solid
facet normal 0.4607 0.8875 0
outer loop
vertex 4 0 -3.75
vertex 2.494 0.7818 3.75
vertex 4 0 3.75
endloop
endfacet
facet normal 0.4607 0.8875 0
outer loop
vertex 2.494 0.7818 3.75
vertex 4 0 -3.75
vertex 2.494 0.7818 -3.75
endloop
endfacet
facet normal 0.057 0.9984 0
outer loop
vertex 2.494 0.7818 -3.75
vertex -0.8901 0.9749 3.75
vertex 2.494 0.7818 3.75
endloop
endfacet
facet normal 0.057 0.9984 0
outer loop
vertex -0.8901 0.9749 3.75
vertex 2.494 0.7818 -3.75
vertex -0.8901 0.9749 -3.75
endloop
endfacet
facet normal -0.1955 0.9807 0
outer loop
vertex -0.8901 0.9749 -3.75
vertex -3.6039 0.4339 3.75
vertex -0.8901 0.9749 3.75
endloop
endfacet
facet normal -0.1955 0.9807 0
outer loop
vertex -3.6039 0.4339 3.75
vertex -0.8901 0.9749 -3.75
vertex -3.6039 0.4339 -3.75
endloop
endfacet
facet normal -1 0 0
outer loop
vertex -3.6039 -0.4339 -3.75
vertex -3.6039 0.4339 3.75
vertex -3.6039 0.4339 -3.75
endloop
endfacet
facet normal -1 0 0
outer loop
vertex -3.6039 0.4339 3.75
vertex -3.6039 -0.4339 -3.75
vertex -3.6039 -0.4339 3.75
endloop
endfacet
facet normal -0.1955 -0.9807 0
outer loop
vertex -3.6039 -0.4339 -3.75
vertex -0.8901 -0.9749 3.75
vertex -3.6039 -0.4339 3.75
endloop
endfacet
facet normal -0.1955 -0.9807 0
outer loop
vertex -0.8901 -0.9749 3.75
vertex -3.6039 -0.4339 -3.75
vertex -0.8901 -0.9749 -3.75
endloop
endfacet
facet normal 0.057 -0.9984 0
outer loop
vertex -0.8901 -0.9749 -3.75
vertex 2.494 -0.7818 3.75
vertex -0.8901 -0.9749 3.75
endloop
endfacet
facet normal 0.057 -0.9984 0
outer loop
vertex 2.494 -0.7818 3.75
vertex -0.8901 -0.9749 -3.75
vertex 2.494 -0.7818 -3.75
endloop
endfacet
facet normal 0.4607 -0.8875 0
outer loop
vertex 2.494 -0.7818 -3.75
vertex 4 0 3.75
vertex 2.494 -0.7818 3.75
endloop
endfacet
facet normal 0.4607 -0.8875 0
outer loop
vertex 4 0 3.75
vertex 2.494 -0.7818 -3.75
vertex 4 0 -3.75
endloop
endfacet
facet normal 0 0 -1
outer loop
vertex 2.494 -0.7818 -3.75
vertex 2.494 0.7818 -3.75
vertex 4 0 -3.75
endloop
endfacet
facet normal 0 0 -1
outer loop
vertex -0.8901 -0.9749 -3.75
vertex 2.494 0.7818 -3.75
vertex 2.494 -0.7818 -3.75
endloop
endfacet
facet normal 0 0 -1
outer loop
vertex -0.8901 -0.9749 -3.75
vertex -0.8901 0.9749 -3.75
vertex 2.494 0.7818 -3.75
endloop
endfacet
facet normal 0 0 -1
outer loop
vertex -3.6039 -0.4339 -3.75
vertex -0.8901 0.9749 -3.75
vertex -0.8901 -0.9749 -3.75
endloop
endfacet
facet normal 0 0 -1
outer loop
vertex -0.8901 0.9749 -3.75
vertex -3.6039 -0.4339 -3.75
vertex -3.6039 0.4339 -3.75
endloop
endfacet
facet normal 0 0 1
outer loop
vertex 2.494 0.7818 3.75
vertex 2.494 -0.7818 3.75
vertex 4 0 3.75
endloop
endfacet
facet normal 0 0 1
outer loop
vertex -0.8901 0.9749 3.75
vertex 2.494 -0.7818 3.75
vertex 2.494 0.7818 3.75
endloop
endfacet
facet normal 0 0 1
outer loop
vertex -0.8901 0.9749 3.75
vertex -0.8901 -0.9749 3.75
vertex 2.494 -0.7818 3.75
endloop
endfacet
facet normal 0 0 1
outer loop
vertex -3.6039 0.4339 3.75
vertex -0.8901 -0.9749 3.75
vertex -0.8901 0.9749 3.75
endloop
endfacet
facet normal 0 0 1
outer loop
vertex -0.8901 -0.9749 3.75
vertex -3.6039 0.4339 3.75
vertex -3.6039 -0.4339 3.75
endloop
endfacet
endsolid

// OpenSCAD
// Generated by generate_scads.py
scale([2.0,0.5,1.5]) {
  cylinder(h=5, r=2, center=true);
}
